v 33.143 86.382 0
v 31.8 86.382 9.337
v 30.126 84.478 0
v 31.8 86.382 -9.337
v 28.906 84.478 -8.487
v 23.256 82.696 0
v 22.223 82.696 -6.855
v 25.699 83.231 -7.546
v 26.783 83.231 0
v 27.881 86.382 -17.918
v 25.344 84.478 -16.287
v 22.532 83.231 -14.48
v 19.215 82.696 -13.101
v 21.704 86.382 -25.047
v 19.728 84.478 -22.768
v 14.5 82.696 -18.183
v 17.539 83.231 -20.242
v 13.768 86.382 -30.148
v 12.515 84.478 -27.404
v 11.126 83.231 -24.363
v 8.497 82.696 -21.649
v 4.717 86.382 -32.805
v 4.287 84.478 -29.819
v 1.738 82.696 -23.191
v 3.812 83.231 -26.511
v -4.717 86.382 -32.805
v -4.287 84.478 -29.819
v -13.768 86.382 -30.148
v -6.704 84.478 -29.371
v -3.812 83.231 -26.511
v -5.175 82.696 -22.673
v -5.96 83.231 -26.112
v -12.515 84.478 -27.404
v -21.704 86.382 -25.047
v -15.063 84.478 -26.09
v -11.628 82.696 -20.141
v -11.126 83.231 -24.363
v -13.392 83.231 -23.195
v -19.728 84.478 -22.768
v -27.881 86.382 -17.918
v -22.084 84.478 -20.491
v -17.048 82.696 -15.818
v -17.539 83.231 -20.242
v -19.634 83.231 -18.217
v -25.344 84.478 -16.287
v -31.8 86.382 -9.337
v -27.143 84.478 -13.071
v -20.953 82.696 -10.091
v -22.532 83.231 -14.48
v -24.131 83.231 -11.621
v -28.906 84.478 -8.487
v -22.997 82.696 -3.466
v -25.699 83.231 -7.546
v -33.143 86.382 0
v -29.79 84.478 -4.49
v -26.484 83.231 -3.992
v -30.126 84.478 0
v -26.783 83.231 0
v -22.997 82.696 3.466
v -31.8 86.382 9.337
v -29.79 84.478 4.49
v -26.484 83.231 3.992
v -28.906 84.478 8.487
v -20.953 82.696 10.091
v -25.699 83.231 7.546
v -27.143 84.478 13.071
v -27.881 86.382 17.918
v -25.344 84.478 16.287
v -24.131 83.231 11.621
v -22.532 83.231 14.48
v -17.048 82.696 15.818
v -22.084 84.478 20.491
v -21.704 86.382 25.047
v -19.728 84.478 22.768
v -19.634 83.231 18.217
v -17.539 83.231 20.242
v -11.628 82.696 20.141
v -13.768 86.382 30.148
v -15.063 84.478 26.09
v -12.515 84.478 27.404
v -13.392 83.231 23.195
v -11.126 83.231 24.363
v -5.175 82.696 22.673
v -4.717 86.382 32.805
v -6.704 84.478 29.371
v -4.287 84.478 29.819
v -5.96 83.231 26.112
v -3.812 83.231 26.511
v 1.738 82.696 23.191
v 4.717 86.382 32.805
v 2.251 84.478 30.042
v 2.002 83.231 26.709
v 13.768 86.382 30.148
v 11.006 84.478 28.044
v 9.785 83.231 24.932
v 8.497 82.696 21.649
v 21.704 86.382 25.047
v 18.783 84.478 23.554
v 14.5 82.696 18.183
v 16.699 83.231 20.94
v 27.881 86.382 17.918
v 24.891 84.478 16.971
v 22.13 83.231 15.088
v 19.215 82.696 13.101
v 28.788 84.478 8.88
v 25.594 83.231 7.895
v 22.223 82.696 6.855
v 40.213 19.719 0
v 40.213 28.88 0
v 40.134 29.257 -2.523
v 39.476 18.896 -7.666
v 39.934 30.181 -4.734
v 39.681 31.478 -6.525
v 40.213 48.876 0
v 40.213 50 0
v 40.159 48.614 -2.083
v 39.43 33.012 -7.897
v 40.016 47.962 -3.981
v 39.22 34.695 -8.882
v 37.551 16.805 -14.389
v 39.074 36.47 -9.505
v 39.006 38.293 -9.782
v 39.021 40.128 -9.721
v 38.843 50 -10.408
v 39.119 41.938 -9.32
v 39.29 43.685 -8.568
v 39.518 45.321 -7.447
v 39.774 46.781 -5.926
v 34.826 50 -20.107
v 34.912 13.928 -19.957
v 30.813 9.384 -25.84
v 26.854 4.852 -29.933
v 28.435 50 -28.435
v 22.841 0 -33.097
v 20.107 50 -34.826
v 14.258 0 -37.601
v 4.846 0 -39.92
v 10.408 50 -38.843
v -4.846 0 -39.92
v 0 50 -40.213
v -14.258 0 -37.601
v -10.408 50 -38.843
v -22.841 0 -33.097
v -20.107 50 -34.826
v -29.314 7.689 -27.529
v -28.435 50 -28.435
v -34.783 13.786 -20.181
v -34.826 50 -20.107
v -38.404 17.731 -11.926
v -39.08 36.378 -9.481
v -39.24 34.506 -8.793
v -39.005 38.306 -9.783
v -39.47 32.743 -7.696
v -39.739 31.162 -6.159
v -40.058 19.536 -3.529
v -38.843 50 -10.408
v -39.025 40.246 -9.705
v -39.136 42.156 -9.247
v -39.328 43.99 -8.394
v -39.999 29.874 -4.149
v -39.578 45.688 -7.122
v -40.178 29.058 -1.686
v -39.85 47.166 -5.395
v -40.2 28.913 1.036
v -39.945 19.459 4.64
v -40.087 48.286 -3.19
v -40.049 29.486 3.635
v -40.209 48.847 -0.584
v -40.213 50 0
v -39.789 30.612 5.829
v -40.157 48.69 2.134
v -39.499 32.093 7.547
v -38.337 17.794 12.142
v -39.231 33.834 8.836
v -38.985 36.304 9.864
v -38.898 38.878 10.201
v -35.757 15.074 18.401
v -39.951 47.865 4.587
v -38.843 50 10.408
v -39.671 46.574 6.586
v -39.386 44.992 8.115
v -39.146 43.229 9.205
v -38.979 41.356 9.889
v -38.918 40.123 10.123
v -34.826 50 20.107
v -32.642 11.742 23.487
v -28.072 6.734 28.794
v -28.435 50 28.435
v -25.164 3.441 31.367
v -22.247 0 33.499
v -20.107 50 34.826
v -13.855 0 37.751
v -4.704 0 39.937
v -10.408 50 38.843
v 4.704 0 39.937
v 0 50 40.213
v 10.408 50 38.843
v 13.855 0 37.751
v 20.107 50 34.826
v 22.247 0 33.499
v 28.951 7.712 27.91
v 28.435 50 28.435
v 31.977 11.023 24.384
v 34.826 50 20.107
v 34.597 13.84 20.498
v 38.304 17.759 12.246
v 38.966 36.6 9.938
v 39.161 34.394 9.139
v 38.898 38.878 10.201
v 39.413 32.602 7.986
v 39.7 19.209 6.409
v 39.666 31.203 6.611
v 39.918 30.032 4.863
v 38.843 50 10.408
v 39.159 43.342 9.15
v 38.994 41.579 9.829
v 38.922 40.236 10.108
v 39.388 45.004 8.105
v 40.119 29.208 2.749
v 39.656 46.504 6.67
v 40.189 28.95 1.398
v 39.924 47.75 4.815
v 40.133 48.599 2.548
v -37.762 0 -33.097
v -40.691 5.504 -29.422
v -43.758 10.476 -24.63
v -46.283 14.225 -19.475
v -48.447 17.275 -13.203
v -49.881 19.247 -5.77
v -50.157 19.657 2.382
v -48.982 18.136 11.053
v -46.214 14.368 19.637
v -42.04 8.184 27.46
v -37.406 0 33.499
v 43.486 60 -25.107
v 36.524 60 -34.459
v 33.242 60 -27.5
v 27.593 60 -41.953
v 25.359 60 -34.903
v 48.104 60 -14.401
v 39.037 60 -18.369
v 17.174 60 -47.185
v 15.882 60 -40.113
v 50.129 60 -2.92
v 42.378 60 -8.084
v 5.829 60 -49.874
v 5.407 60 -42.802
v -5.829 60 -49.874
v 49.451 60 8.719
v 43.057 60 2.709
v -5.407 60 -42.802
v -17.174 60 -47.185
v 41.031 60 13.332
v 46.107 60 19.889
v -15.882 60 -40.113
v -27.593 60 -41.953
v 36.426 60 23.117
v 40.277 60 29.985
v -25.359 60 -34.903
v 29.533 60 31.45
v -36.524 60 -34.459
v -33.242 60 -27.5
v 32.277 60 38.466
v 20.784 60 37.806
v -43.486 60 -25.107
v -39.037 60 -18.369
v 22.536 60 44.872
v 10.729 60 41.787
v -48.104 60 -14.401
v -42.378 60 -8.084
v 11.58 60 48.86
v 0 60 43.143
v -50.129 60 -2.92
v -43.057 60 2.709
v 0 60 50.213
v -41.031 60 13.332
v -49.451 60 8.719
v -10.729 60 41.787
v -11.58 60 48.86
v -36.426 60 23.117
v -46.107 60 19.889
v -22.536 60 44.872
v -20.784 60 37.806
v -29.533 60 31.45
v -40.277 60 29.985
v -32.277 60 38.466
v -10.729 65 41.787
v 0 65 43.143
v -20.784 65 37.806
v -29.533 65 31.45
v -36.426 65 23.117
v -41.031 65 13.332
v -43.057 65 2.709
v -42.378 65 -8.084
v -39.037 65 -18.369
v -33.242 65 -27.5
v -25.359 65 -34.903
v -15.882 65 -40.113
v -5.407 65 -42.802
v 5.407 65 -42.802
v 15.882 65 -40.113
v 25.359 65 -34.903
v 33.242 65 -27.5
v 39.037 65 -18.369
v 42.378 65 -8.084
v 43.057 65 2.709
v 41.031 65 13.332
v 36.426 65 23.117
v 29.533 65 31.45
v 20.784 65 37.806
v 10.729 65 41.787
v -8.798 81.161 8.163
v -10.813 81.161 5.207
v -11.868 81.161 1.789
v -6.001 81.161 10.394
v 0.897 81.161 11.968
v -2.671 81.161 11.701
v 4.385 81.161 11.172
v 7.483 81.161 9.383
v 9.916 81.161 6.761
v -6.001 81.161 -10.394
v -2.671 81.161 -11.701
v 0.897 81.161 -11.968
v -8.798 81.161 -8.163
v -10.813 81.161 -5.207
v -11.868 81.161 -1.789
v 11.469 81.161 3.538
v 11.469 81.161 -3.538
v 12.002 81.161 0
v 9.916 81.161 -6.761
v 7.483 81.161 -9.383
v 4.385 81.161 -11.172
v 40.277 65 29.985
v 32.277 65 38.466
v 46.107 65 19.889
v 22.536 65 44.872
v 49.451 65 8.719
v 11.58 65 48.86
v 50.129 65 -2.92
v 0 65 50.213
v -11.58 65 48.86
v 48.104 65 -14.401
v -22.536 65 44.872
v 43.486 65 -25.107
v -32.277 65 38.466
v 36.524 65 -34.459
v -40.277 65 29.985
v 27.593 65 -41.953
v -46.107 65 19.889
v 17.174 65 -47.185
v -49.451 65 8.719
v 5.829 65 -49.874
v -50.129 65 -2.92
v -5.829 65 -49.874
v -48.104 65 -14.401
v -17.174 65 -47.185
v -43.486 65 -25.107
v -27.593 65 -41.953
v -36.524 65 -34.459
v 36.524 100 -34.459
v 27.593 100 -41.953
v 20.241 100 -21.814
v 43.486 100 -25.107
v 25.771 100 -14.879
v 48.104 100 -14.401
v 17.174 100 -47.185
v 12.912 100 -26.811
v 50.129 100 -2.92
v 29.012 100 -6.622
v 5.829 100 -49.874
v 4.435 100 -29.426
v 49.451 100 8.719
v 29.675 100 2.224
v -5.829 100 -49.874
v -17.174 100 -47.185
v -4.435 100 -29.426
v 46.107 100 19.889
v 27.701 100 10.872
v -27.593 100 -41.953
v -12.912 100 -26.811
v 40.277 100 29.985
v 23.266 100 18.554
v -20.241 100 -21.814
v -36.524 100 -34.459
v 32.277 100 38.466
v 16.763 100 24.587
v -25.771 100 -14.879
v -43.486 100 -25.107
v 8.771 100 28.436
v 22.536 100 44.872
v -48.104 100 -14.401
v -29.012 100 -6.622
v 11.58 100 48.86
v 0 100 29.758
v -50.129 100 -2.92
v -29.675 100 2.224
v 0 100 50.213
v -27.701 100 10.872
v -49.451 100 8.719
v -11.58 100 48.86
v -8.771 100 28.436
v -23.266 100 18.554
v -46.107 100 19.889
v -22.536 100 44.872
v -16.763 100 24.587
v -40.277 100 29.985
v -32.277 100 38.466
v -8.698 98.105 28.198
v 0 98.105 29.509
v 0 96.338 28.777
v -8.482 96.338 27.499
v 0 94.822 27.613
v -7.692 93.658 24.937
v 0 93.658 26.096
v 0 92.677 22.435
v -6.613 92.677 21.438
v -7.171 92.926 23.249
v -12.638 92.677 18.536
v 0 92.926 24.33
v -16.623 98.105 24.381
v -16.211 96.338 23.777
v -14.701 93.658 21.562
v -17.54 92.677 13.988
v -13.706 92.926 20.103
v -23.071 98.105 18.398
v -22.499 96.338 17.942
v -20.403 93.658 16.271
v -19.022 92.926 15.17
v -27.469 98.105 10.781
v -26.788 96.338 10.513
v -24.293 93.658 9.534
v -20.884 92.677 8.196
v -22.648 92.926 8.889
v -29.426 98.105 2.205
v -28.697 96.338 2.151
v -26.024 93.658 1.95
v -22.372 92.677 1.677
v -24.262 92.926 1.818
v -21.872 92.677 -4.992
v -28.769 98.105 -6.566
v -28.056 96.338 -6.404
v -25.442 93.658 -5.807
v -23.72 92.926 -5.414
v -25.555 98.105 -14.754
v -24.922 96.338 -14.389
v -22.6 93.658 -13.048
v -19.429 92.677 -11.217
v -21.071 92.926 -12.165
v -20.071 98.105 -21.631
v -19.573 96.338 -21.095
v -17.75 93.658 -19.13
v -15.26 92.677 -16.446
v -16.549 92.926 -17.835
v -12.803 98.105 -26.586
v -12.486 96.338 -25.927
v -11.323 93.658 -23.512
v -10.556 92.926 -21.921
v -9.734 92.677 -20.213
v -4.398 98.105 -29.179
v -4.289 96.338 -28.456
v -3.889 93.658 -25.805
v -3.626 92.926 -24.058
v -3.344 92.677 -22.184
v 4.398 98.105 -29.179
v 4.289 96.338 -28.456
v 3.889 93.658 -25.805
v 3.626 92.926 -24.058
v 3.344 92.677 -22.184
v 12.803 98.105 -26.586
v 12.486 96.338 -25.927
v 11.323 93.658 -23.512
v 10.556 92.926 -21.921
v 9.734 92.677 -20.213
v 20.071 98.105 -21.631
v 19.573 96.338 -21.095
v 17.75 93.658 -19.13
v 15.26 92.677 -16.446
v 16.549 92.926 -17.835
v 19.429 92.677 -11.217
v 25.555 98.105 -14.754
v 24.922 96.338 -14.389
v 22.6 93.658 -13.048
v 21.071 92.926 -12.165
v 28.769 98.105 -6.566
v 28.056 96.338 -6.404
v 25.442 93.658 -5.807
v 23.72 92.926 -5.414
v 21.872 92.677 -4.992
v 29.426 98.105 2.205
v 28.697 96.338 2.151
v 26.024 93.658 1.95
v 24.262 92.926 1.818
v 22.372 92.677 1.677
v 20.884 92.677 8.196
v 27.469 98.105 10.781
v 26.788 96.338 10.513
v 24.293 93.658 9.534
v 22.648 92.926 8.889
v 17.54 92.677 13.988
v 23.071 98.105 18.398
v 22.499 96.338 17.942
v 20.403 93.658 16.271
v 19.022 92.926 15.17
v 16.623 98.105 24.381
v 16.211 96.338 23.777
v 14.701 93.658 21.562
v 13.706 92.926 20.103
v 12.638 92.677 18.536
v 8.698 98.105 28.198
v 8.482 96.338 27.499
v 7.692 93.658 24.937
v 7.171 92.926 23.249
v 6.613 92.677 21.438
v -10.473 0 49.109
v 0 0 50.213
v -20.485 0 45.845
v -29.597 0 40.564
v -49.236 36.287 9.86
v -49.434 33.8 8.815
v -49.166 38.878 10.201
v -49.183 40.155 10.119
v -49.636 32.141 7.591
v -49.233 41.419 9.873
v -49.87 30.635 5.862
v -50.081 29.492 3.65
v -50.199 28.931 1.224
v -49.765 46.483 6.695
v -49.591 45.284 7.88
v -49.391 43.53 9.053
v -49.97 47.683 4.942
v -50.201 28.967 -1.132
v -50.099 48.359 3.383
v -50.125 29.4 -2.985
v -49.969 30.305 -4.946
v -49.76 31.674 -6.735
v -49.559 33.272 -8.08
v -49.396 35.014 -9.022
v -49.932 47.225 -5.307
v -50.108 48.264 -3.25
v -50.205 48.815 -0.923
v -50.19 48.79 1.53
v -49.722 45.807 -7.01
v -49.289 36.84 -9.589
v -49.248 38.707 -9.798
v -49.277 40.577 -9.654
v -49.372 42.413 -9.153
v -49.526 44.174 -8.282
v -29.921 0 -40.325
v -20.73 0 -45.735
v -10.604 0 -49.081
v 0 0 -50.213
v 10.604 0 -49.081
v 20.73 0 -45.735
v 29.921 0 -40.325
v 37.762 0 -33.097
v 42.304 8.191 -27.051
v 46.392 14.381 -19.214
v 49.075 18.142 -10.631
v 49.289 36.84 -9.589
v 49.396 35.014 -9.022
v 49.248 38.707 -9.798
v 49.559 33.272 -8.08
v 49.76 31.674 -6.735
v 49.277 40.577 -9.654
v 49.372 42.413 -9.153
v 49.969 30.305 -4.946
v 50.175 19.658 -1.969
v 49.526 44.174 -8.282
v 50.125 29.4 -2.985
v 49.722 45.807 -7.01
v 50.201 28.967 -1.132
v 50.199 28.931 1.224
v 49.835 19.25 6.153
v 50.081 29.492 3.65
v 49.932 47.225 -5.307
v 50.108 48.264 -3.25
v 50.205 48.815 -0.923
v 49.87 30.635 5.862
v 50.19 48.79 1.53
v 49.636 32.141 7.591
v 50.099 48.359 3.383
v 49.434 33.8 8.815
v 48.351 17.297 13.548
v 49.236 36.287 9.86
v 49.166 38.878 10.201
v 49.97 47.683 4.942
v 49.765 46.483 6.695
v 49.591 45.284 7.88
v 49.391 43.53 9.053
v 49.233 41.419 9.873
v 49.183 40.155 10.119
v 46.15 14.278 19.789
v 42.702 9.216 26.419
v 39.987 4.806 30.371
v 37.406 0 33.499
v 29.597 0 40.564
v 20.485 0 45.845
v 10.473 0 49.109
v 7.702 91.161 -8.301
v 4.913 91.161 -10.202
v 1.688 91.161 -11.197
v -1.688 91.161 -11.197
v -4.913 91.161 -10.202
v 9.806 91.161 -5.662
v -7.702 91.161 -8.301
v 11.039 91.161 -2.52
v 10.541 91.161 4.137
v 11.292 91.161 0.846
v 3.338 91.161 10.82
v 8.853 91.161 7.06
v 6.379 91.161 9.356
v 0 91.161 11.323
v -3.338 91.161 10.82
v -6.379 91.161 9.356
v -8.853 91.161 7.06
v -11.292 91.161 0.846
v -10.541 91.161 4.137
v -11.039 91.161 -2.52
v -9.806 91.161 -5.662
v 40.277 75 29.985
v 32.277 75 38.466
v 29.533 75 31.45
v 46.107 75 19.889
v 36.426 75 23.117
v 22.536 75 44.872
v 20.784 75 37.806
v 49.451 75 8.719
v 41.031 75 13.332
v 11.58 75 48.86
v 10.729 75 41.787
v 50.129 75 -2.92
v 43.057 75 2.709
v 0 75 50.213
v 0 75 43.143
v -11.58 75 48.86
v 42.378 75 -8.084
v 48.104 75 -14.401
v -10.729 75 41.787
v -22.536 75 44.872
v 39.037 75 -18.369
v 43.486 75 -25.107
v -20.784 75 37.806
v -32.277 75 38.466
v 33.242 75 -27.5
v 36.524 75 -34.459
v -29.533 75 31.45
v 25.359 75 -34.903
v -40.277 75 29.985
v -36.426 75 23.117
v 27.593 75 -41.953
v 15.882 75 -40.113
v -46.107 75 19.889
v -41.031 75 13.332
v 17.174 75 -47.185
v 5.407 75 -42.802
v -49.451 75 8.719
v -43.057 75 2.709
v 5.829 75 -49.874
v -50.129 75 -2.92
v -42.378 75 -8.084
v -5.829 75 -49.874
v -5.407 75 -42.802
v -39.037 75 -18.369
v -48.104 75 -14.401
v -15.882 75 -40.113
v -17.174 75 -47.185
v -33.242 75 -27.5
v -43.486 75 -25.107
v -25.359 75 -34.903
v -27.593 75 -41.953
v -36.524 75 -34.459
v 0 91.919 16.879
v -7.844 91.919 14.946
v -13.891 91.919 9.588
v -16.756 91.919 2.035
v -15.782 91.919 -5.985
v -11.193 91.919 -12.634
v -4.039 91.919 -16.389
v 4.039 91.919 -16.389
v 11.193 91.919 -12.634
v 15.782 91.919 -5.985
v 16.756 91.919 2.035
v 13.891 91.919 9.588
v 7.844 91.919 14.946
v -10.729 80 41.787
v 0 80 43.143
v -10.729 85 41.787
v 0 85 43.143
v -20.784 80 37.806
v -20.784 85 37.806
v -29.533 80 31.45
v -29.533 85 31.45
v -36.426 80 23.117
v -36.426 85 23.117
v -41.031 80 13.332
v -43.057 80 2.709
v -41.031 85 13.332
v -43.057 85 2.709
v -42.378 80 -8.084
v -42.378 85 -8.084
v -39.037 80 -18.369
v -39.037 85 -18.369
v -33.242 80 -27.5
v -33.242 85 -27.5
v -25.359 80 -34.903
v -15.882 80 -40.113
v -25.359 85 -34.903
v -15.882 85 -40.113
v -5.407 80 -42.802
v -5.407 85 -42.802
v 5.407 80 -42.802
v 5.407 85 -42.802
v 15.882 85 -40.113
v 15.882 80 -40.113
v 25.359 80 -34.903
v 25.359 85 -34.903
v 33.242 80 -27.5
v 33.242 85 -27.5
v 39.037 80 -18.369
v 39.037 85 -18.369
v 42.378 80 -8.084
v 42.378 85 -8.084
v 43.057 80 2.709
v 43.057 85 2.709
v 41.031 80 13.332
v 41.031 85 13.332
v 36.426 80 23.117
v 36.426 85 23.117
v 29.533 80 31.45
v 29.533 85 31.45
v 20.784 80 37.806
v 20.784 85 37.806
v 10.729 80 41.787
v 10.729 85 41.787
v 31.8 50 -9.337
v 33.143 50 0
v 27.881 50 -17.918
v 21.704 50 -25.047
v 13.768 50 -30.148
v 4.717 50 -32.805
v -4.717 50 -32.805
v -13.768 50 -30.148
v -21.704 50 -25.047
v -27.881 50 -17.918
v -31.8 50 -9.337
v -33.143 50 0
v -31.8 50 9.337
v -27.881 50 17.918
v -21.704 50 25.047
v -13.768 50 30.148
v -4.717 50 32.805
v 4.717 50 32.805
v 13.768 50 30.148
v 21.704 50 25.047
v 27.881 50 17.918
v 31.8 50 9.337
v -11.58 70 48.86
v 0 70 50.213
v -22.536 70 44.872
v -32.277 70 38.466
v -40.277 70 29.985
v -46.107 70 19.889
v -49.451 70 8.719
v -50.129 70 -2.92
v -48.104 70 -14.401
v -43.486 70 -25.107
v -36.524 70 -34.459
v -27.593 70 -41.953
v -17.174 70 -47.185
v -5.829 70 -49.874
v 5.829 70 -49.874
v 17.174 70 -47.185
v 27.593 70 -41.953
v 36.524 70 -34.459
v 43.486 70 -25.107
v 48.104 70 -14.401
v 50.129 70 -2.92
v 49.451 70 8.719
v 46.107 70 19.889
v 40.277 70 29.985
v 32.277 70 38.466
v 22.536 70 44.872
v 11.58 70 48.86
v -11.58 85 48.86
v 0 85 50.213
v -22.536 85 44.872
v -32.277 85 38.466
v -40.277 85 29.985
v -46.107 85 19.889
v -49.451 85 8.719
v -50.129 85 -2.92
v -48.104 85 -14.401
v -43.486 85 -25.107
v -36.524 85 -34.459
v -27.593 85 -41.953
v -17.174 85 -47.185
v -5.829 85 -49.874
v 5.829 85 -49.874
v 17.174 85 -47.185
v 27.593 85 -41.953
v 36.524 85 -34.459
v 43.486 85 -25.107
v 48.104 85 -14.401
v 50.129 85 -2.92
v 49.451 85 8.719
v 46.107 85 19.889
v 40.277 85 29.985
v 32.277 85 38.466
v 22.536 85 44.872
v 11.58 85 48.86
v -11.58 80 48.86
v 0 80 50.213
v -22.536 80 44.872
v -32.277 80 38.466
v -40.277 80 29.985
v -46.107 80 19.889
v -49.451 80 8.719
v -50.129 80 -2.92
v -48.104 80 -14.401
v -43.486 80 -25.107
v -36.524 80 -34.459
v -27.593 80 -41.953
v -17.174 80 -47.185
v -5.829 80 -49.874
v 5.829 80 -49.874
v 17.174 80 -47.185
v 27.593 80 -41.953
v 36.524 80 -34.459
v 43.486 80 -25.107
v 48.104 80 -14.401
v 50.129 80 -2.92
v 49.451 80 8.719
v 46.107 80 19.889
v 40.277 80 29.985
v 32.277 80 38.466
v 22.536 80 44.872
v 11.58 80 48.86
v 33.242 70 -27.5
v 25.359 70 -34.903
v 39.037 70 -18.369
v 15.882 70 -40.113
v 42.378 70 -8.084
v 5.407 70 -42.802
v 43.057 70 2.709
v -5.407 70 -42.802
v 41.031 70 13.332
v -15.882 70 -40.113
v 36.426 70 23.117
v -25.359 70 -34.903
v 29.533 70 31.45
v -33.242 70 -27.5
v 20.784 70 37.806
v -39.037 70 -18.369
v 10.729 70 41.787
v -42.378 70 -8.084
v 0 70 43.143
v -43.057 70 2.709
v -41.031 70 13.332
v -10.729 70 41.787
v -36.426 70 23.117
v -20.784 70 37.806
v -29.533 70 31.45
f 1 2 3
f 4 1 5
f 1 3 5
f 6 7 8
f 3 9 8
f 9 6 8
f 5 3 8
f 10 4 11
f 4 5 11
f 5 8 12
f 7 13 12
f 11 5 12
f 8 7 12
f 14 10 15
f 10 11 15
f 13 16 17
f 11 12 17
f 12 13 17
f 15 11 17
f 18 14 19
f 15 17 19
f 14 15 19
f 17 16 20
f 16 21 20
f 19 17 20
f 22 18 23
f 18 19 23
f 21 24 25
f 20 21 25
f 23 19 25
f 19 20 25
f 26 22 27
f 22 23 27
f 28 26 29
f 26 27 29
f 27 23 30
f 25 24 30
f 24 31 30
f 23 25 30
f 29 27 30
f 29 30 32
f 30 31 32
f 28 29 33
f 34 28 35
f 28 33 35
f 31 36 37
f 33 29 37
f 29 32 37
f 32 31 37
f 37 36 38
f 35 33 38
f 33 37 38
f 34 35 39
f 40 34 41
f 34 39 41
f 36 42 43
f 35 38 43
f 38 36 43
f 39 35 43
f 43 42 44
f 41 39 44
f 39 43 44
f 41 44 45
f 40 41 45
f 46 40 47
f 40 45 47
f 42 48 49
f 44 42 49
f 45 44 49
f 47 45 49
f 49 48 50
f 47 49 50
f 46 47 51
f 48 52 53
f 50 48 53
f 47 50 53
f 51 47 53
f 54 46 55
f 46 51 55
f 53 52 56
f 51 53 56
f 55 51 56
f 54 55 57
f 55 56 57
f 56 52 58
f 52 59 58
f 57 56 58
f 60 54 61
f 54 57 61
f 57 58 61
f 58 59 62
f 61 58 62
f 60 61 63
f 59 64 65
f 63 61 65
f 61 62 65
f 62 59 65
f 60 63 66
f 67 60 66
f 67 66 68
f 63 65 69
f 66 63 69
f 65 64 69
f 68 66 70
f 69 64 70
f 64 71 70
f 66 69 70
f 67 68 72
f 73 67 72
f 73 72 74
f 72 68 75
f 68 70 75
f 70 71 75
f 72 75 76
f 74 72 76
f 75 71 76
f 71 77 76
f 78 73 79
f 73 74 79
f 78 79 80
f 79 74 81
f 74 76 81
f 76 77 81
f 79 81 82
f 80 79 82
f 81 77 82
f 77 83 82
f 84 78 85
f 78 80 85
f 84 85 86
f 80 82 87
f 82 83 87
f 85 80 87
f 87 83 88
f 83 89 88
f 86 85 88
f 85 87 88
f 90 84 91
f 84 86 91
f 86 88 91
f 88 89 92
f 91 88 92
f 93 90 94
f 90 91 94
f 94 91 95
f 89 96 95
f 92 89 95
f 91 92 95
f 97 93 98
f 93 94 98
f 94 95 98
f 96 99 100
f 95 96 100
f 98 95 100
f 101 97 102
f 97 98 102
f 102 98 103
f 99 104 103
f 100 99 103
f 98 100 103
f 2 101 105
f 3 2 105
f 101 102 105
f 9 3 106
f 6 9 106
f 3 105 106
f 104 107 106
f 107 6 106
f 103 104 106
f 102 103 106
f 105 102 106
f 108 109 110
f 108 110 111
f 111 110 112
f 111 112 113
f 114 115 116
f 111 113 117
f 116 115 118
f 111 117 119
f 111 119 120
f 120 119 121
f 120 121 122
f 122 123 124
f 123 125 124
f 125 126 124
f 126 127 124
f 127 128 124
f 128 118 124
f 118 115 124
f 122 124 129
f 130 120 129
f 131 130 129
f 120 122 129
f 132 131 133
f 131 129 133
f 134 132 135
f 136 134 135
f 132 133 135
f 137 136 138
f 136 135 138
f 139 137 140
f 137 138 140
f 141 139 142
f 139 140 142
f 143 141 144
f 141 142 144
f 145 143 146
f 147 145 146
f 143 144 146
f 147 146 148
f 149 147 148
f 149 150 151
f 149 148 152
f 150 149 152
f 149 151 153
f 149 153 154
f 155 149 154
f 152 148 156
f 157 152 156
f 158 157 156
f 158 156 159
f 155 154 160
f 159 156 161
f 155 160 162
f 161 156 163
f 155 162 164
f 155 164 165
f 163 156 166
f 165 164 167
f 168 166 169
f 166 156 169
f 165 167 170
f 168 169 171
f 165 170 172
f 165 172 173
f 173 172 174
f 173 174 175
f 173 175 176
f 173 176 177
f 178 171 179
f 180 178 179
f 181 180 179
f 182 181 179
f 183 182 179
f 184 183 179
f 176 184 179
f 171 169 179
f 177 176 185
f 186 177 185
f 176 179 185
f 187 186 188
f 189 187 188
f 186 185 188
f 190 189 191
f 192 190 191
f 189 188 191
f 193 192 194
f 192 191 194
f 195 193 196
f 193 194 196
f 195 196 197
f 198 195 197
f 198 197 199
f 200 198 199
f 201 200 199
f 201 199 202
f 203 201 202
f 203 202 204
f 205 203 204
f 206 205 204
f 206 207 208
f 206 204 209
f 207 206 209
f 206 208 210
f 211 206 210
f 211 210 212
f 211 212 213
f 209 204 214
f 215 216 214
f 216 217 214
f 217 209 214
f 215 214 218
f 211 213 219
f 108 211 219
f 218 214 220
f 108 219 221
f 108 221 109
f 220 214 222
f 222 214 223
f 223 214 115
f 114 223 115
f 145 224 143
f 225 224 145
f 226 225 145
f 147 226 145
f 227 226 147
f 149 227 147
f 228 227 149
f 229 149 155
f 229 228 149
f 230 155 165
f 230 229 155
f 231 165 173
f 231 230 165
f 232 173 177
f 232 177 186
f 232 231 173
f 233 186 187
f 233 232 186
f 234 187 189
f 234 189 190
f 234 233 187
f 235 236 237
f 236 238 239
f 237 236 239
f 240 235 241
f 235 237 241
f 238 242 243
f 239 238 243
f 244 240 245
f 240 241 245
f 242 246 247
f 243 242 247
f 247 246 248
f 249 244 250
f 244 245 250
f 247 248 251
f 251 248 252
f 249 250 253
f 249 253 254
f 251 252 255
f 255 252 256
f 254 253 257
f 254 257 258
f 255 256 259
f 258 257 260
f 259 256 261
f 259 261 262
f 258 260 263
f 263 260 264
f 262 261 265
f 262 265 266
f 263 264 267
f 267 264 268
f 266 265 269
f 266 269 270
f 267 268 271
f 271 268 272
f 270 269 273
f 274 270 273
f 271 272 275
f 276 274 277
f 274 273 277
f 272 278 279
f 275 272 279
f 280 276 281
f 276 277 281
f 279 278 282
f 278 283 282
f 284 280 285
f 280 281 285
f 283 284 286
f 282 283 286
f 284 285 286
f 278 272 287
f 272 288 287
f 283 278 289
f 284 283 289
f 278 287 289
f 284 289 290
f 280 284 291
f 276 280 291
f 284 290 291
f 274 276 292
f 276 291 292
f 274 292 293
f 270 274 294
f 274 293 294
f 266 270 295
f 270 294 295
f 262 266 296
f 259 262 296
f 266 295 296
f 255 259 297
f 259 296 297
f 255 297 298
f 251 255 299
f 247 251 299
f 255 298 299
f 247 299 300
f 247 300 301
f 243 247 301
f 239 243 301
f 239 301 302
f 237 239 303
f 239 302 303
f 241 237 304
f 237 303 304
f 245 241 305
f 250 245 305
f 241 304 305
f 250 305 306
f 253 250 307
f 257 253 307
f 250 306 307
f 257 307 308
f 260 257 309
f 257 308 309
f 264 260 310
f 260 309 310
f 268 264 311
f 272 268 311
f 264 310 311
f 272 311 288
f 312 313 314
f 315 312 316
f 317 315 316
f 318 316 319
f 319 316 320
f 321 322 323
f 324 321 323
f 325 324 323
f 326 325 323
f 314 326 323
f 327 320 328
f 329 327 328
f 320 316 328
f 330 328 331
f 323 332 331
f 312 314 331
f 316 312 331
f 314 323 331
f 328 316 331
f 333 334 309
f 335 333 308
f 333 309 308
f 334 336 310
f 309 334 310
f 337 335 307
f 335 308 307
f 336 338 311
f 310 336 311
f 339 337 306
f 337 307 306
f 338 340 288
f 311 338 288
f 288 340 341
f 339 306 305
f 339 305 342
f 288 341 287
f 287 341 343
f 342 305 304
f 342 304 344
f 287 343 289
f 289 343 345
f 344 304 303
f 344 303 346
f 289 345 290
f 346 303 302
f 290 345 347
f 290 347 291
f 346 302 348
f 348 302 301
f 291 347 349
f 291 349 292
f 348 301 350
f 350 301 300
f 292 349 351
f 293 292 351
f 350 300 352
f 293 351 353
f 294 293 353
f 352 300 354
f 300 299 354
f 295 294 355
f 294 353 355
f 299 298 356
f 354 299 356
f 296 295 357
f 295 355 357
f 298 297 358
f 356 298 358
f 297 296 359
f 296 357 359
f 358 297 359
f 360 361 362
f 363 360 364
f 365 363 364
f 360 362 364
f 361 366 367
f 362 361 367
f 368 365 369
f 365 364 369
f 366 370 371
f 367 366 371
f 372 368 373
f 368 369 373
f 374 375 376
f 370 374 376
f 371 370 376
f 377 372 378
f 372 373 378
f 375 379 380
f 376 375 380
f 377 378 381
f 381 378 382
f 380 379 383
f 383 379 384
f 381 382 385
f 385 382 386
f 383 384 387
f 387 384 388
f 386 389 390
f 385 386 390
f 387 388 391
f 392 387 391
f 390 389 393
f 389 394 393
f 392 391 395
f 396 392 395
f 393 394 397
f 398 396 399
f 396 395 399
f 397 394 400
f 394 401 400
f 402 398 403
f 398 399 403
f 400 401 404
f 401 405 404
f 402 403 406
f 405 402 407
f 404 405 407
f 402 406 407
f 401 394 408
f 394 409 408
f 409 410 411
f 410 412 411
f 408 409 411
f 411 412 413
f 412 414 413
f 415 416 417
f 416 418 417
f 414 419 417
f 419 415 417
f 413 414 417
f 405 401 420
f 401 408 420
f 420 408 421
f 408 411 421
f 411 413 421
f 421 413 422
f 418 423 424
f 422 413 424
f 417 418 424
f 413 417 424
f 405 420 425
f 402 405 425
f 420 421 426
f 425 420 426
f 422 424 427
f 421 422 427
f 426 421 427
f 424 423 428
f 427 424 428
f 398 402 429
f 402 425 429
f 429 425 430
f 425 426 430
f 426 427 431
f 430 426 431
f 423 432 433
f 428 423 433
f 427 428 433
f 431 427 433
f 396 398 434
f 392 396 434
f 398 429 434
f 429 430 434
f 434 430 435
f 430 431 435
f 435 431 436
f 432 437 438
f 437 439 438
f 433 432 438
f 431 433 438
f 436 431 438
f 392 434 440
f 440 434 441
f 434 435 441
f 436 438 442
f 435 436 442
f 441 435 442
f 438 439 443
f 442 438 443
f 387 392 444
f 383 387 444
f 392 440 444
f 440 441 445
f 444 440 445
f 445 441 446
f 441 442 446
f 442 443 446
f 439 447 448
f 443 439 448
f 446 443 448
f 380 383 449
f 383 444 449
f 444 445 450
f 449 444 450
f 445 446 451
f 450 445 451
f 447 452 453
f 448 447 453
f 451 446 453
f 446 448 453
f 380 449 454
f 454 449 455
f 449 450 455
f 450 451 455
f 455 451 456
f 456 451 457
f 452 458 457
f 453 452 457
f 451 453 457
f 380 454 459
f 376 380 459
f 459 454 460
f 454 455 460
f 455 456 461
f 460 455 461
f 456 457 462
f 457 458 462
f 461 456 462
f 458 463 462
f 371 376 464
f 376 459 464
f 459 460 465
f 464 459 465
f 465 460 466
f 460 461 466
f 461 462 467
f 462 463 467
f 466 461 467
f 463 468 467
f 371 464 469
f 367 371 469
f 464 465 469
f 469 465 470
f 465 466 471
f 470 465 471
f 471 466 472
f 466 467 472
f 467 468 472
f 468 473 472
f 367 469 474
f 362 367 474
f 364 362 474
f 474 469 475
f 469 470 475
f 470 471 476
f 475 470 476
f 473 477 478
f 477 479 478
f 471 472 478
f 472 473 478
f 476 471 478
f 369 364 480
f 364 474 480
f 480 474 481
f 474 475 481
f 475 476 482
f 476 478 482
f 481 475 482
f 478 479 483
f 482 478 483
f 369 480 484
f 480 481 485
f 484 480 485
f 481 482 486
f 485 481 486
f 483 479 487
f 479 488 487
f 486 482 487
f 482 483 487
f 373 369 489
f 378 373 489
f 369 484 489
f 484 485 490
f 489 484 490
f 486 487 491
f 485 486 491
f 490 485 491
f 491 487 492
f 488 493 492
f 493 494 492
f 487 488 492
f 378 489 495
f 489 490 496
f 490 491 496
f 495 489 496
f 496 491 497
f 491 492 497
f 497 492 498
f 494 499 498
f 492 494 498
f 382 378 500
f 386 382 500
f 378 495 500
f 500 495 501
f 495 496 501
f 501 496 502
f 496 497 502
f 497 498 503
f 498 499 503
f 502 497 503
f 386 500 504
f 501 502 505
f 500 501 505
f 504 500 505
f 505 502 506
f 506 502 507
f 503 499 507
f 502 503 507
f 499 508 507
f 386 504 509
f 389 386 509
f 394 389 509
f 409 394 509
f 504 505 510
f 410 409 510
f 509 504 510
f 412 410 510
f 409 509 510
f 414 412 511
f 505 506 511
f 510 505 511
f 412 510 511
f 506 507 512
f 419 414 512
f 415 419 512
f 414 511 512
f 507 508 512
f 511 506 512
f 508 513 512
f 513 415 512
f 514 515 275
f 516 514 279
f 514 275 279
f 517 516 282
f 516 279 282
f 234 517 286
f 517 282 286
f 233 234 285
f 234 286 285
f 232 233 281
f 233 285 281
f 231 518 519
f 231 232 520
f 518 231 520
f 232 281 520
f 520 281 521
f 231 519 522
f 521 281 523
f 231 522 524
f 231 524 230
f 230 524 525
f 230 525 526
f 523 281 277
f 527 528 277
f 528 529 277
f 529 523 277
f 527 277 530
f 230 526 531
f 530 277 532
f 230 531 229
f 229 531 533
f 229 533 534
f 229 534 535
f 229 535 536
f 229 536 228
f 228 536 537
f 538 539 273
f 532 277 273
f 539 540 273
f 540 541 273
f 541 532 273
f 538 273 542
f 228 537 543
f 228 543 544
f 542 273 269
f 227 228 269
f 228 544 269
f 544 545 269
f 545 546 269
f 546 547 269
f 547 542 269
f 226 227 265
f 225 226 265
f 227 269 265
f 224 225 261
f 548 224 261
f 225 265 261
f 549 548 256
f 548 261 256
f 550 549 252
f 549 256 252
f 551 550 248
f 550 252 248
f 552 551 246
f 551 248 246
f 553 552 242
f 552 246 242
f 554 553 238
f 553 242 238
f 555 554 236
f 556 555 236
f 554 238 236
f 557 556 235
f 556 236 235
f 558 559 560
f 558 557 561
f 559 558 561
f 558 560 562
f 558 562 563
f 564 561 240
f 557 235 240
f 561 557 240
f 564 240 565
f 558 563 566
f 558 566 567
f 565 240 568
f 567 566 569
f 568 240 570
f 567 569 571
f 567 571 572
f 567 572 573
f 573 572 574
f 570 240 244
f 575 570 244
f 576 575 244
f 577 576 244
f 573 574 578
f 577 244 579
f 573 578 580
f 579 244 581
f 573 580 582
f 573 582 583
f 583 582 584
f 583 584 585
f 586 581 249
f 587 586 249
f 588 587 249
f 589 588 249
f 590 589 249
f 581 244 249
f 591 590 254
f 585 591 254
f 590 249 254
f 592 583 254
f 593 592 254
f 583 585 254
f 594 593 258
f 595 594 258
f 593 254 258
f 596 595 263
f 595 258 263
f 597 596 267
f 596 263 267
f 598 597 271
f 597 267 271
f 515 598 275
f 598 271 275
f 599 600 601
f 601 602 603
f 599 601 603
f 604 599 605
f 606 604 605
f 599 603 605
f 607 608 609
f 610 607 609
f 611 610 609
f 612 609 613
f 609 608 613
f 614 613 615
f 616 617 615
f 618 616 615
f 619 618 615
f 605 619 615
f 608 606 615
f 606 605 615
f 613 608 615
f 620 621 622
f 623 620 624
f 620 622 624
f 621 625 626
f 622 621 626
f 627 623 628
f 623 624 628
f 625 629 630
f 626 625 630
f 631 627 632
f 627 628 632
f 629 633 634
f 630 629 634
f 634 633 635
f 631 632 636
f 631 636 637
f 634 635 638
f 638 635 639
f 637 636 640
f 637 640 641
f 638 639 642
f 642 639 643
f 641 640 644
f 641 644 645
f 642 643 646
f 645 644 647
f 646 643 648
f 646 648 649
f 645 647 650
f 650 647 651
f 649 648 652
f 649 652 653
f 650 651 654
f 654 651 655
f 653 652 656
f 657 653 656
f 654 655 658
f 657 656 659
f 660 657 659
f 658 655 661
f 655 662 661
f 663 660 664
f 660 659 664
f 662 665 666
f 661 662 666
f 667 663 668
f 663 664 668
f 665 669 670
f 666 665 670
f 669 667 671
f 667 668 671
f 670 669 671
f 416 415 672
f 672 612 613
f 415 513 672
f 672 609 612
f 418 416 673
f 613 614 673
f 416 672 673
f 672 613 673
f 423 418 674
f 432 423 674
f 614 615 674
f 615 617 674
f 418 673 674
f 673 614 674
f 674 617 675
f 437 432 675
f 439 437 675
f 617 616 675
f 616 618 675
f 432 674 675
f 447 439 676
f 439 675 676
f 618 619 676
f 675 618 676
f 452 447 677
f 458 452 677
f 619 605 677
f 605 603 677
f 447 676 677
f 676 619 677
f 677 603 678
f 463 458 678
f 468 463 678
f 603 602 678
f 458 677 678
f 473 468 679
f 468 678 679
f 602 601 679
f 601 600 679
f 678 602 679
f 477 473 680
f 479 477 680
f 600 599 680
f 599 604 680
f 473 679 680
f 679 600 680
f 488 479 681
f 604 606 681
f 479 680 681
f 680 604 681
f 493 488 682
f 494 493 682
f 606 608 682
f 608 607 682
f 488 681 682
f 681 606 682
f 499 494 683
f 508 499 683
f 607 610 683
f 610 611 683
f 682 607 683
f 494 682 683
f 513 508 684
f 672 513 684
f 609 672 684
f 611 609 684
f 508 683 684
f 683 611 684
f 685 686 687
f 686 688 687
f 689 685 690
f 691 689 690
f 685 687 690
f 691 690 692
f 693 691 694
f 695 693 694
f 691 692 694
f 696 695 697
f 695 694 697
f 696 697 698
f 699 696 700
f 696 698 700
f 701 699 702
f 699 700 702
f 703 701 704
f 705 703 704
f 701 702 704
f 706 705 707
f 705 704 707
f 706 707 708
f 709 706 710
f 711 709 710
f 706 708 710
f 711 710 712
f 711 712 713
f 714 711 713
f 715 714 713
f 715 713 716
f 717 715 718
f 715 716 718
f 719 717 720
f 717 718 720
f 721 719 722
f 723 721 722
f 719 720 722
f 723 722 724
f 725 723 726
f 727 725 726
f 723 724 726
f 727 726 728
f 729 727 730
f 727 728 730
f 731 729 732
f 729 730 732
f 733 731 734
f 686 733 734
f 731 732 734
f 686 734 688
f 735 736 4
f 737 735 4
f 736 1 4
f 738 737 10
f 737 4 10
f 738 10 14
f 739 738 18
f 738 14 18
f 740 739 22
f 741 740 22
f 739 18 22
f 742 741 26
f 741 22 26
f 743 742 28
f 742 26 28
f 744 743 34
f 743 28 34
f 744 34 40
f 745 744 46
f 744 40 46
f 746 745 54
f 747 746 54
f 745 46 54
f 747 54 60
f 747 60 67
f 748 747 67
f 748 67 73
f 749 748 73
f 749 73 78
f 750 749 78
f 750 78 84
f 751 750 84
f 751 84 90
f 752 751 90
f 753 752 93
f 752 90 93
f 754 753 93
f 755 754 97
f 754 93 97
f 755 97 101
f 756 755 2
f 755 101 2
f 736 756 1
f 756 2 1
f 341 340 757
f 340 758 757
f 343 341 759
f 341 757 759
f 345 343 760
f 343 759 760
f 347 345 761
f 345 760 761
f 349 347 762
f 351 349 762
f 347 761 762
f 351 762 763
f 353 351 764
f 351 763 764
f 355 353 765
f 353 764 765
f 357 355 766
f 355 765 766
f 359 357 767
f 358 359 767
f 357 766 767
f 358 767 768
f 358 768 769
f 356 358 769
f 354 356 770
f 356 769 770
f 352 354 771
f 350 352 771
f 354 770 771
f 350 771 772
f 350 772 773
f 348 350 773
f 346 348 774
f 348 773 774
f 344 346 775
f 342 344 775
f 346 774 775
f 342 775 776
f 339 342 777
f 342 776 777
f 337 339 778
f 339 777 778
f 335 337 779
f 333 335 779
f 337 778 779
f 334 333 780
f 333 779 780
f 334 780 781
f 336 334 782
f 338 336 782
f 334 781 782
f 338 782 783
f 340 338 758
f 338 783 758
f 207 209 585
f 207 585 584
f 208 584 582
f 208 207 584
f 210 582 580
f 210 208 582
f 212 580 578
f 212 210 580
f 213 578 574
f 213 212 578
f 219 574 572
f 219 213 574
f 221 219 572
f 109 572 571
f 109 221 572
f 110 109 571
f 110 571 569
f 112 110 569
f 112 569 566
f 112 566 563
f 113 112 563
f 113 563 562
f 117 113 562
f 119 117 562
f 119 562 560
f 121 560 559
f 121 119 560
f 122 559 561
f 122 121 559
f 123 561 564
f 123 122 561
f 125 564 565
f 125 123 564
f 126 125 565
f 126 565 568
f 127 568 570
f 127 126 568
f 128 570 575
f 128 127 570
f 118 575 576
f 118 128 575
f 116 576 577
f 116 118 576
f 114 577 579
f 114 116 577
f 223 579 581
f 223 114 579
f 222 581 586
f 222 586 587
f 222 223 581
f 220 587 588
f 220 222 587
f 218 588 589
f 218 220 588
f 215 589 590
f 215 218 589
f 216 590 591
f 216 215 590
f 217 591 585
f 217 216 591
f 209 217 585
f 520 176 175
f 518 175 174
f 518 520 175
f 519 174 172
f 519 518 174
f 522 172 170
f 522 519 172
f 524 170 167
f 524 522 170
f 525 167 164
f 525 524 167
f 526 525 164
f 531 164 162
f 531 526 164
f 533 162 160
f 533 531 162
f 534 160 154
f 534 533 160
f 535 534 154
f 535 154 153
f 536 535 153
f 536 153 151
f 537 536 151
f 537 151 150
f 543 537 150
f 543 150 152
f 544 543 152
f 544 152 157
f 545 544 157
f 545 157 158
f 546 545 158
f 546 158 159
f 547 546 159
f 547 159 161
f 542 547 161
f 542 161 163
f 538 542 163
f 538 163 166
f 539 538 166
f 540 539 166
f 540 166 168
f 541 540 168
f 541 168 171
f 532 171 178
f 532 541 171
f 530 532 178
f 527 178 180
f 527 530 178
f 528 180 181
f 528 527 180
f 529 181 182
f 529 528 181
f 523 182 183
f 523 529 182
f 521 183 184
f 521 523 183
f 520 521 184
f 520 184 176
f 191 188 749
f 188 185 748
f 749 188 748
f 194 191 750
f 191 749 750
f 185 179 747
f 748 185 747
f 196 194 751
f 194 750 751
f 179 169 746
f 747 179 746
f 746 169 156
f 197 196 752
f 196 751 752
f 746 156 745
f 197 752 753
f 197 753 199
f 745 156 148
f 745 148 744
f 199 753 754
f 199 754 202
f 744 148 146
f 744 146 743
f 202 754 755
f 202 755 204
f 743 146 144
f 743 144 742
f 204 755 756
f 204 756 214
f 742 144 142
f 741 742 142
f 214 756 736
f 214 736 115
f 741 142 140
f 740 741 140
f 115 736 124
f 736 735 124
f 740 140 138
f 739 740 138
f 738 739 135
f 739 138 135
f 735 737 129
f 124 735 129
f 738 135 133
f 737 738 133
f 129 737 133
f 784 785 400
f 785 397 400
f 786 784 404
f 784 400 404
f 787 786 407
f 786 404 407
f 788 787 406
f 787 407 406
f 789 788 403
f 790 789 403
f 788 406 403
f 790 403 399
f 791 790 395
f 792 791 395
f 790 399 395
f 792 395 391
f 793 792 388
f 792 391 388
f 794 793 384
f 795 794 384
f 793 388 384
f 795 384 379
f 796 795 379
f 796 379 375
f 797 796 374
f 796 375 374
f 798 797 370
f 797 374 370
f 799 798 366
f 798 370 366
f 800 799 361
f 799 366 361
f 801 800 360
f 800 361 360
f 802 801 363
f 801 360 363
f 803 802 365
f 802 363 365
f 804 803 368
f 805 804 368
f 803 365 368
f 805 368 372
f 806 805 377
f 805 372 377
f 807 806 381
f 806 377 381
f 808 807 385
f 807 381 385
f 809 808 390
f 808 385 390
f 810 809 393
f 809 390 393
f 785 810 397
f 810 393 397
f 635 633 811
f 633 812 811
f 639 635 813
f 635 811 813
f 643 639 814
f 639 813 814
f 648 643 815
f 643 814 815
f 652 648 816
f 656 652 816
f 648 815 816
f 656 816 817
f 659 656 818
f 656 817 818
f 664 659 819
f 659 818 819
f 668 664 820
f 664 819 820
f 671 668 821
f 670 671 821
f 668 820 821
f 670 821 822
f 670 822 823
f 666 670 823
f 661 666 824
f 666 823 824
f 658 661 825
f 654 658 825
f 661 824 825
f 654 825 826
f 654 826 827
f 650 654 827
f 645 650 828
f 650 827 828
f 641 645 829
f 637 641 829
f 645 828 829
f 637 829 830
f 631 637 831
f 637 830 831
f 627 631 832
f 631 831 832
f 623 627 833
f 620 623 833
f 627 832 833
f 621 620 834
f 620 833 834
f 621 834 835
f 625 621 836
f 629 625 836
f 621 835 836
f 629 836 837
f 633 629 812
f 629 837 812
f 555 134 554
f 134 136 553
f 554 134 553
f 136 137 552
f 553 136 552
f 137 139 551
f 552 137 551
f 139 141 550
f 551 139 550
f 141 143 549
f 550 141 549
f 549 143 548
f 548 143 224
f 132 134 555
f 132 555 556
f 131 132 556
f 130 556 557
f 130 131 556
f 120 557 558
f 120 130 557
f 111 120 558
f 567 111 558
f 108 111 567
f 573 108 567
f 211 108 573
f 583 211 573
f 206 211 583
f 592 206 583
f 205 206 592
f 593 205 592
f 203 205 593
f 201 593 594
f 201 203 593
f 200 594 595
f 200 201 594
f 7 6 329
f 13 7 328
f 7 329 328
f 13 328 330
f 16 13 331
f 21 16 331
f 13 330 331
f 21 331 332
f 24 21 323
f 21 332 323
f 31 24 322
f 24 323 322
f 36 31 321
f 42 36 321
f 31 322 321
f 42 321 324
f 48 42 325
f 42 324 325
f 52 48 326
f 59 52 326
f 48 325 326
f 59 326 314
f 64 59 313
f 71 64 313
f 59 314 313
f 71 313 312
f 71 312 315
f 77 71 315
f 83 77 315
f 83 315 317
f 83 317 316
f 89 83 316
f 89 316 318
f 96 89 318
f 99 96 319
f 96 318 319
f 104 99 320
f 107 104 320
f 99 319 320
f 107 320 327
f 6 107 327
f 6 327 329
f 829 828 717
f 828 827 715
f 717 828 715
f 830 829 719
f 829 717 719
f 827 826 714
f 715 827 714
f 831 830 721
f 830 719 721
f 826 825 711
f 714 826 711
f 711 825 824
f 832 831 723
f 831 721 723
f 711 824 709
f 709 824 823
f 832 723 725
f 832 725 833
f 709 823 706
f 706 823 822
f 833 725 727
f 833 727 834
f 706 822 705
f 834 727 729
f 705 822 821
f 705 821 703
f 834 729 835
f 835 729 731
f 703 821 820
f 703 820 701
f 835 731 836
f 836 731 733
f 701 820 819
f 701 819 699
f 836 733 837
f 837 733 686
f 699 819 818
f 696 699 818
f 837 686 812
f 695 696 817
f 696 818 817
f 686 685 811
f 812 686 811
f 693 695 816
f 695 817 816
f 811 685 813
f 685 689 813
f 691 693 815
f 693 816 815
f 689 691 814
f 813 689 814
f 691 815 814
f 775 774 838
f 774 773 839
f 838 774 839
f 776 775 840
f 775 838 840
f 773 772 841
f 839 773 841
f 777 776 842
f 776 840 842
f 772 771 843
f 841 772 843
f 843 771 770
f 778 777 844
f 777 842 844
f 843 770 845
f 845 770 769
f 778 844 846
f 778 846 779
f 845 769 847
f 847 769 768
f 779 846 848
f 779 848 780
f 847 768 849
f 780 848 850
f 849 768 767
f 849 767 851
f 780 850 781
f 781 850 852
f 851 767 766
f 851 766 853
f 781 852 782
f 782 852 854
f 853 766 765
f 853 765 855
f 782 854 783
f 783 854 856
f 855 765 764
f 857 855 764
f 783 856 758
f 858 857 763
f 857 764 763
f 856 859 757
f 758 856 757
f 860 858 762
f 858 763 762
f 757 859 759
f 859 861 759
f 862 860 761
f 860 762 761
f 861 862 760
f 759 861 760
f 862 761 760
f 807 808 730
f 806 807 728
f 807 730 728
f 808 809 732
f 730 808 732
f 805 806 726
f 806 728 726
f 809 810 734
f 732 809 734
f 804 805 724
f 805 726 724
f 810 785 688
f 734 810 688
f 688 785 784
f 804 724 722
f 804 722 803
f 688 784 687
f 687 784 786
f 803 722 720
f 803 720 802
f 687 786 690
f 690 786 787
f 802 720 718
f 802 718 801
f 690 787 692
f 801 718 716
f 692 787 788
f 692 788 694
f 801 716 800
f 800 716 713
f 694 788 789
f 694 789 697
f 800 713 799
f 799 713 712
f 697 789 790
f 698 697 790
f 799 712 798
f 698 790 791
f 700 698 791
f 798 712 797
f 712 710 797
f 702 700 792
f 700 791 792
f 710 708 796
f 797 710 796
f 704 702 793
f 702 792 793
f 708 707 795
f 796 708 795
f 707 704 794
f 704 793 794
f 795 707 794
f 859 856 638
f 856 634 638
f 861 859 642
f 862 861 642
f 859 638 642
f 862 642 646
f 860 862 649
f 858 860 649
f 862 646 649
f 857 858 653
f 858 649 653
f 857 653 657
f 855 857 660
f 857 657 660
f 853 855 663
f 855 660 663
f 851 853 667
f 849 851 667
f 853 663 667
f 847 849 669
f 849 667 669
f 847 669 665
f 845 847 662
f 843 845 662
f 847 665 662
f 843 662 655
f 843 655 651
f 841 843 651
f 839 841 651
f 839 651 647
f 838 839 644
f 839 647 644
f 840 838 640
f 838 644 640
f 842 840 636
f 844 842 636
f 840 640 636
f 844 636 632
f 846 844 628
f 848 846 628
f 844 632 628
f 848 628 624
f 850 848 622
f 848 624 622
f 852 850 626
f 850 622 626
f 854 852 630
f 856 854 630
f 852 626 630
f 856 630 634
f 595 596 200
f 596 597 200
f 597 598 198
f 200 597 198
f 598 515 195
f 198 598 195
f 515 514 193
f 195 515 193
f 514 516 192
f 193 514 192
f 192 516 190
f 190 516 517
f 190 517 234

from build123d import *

# Parameters (mm, degrees)
CUT_EXTRUDE1_DEPTH      = 60
CUT_EXTRUDE1_DEPTH_BACK = 60
SKETCH2_R               = 10


with BuildPart() as part:
    # Sketch1 → Revolve1 (revolve)
    with BuildSketch(Plane.XY, mode=Mode.PRIVATE) as revolve1_sk:
        with BuildLine():
            Line((-50.213491879, 0), (-50.213491879, 60))
            Line((-50.213491879, 60), (-43.142539091, 60))
            Line((-43.142539091, 60), (-43.142539091, 65))
            Line((-43.142539091, 65), (-50.213491879, 65))
            Line((-50.213491879, 65), (-50.213491879, 70))
            Line((-50.213491879, 70), (-43.142539091, 70))
            Line((-43.142539091, 70), (-43.142539091, 75))
            Line((-43.142539091, 75), (-50.213491879, 75))
            Line((-50.213491879, 75), (-50.213491879, 80))
            Line((-50.213491879, 80), (-43.142539091, 80))
            Line((-43.142539091, 80), (-43.142539091, 85))
            Line((-43.142539091, 85), (-50.213491879, 85))
            Line((-50.213491879, 85), (-50.213491879, 100))
            Line((-50.213491879, 100), (-29.758235601, 100))
            ThreePointArc((-29.758235601, 100), (-27.613235974, 94.821512811), (-22.434748785, 92.676513184))
            Line((-22.434748785, 92.676513184), (-11.323251547, 91.161309016))
            Line((-11.323251547, 91.161309016), (0, 91.161309016))
            Line((0, 91.161309016), (0, 0))
            Line((0, 0), (-50.213491879, 0))
        make_face()
    revolve(revolve1_sk.sketch.rotate(Axis((0, 116.04188361, 0), (0, -1, 0)), 270), axis=Axis((0, 116.04188361, 0), (0, -1, 0)))

    # Shell1: read off the stored shape, not the designer's step
    # Shell1 outline → Shell1 (revolve, cut)
    with BuildSketch(Plane.XY):
        with BuildLine():
            Line((12.001929251, 81.161309016), (0, 81.161309016))
            Line((0, 81.161309016), (0, 0))
            Line((0, 0), (40.213491879, 0))
            Line((40.213491879, 0), (40.213491879, 50))
            Line((40.213491879, 50), (33.142539091, 50))
            Line((33.142539091, 50), (33.142539091, 86.382128573))
            ThreePointArc((33.142539091, 86.382128573), (28.486928042, 83.768107883), (23.256399997, 82.696009572))
            Line((23.256399997, 82.696009572), (12.001929251, 81.161309016))
        make_face()
    revolve(axis=Axis((0, 0, 0), (0, 1, 0)), mode=Mode.SUBTRACT)

    # Sketch2 → Cut-Extrude1 (cut, two sides: drawn at the far end of the back side and taken through both)
    with BuildSketch(Plane(origin=(0, 0, 0), x_dir=(0, 0, -1), z_dir=(1, 0, 0)).offset(-CUT_EXTRUDE1_DEPTH_BACK)):
        with Locations(Location((-0.200994326, 38.878313976, 0), (0, 0, 180))):
            Circle(SKETCH2_R)
        with BuildLine():
            Line((-33.49905429, 0), (33.097065639, 0))
            ThreePointArc((33.097065639, 0), (-0.200994326, 19.719751163), (-33.49905429, 0))
        make_face()
    extrude(amount=CUT_EXTRUDE1_DEPTH + CUT_EXTRUDE1_DEPTH_BACK, mode=Mode.SUBTRACT)


solid = part.part
